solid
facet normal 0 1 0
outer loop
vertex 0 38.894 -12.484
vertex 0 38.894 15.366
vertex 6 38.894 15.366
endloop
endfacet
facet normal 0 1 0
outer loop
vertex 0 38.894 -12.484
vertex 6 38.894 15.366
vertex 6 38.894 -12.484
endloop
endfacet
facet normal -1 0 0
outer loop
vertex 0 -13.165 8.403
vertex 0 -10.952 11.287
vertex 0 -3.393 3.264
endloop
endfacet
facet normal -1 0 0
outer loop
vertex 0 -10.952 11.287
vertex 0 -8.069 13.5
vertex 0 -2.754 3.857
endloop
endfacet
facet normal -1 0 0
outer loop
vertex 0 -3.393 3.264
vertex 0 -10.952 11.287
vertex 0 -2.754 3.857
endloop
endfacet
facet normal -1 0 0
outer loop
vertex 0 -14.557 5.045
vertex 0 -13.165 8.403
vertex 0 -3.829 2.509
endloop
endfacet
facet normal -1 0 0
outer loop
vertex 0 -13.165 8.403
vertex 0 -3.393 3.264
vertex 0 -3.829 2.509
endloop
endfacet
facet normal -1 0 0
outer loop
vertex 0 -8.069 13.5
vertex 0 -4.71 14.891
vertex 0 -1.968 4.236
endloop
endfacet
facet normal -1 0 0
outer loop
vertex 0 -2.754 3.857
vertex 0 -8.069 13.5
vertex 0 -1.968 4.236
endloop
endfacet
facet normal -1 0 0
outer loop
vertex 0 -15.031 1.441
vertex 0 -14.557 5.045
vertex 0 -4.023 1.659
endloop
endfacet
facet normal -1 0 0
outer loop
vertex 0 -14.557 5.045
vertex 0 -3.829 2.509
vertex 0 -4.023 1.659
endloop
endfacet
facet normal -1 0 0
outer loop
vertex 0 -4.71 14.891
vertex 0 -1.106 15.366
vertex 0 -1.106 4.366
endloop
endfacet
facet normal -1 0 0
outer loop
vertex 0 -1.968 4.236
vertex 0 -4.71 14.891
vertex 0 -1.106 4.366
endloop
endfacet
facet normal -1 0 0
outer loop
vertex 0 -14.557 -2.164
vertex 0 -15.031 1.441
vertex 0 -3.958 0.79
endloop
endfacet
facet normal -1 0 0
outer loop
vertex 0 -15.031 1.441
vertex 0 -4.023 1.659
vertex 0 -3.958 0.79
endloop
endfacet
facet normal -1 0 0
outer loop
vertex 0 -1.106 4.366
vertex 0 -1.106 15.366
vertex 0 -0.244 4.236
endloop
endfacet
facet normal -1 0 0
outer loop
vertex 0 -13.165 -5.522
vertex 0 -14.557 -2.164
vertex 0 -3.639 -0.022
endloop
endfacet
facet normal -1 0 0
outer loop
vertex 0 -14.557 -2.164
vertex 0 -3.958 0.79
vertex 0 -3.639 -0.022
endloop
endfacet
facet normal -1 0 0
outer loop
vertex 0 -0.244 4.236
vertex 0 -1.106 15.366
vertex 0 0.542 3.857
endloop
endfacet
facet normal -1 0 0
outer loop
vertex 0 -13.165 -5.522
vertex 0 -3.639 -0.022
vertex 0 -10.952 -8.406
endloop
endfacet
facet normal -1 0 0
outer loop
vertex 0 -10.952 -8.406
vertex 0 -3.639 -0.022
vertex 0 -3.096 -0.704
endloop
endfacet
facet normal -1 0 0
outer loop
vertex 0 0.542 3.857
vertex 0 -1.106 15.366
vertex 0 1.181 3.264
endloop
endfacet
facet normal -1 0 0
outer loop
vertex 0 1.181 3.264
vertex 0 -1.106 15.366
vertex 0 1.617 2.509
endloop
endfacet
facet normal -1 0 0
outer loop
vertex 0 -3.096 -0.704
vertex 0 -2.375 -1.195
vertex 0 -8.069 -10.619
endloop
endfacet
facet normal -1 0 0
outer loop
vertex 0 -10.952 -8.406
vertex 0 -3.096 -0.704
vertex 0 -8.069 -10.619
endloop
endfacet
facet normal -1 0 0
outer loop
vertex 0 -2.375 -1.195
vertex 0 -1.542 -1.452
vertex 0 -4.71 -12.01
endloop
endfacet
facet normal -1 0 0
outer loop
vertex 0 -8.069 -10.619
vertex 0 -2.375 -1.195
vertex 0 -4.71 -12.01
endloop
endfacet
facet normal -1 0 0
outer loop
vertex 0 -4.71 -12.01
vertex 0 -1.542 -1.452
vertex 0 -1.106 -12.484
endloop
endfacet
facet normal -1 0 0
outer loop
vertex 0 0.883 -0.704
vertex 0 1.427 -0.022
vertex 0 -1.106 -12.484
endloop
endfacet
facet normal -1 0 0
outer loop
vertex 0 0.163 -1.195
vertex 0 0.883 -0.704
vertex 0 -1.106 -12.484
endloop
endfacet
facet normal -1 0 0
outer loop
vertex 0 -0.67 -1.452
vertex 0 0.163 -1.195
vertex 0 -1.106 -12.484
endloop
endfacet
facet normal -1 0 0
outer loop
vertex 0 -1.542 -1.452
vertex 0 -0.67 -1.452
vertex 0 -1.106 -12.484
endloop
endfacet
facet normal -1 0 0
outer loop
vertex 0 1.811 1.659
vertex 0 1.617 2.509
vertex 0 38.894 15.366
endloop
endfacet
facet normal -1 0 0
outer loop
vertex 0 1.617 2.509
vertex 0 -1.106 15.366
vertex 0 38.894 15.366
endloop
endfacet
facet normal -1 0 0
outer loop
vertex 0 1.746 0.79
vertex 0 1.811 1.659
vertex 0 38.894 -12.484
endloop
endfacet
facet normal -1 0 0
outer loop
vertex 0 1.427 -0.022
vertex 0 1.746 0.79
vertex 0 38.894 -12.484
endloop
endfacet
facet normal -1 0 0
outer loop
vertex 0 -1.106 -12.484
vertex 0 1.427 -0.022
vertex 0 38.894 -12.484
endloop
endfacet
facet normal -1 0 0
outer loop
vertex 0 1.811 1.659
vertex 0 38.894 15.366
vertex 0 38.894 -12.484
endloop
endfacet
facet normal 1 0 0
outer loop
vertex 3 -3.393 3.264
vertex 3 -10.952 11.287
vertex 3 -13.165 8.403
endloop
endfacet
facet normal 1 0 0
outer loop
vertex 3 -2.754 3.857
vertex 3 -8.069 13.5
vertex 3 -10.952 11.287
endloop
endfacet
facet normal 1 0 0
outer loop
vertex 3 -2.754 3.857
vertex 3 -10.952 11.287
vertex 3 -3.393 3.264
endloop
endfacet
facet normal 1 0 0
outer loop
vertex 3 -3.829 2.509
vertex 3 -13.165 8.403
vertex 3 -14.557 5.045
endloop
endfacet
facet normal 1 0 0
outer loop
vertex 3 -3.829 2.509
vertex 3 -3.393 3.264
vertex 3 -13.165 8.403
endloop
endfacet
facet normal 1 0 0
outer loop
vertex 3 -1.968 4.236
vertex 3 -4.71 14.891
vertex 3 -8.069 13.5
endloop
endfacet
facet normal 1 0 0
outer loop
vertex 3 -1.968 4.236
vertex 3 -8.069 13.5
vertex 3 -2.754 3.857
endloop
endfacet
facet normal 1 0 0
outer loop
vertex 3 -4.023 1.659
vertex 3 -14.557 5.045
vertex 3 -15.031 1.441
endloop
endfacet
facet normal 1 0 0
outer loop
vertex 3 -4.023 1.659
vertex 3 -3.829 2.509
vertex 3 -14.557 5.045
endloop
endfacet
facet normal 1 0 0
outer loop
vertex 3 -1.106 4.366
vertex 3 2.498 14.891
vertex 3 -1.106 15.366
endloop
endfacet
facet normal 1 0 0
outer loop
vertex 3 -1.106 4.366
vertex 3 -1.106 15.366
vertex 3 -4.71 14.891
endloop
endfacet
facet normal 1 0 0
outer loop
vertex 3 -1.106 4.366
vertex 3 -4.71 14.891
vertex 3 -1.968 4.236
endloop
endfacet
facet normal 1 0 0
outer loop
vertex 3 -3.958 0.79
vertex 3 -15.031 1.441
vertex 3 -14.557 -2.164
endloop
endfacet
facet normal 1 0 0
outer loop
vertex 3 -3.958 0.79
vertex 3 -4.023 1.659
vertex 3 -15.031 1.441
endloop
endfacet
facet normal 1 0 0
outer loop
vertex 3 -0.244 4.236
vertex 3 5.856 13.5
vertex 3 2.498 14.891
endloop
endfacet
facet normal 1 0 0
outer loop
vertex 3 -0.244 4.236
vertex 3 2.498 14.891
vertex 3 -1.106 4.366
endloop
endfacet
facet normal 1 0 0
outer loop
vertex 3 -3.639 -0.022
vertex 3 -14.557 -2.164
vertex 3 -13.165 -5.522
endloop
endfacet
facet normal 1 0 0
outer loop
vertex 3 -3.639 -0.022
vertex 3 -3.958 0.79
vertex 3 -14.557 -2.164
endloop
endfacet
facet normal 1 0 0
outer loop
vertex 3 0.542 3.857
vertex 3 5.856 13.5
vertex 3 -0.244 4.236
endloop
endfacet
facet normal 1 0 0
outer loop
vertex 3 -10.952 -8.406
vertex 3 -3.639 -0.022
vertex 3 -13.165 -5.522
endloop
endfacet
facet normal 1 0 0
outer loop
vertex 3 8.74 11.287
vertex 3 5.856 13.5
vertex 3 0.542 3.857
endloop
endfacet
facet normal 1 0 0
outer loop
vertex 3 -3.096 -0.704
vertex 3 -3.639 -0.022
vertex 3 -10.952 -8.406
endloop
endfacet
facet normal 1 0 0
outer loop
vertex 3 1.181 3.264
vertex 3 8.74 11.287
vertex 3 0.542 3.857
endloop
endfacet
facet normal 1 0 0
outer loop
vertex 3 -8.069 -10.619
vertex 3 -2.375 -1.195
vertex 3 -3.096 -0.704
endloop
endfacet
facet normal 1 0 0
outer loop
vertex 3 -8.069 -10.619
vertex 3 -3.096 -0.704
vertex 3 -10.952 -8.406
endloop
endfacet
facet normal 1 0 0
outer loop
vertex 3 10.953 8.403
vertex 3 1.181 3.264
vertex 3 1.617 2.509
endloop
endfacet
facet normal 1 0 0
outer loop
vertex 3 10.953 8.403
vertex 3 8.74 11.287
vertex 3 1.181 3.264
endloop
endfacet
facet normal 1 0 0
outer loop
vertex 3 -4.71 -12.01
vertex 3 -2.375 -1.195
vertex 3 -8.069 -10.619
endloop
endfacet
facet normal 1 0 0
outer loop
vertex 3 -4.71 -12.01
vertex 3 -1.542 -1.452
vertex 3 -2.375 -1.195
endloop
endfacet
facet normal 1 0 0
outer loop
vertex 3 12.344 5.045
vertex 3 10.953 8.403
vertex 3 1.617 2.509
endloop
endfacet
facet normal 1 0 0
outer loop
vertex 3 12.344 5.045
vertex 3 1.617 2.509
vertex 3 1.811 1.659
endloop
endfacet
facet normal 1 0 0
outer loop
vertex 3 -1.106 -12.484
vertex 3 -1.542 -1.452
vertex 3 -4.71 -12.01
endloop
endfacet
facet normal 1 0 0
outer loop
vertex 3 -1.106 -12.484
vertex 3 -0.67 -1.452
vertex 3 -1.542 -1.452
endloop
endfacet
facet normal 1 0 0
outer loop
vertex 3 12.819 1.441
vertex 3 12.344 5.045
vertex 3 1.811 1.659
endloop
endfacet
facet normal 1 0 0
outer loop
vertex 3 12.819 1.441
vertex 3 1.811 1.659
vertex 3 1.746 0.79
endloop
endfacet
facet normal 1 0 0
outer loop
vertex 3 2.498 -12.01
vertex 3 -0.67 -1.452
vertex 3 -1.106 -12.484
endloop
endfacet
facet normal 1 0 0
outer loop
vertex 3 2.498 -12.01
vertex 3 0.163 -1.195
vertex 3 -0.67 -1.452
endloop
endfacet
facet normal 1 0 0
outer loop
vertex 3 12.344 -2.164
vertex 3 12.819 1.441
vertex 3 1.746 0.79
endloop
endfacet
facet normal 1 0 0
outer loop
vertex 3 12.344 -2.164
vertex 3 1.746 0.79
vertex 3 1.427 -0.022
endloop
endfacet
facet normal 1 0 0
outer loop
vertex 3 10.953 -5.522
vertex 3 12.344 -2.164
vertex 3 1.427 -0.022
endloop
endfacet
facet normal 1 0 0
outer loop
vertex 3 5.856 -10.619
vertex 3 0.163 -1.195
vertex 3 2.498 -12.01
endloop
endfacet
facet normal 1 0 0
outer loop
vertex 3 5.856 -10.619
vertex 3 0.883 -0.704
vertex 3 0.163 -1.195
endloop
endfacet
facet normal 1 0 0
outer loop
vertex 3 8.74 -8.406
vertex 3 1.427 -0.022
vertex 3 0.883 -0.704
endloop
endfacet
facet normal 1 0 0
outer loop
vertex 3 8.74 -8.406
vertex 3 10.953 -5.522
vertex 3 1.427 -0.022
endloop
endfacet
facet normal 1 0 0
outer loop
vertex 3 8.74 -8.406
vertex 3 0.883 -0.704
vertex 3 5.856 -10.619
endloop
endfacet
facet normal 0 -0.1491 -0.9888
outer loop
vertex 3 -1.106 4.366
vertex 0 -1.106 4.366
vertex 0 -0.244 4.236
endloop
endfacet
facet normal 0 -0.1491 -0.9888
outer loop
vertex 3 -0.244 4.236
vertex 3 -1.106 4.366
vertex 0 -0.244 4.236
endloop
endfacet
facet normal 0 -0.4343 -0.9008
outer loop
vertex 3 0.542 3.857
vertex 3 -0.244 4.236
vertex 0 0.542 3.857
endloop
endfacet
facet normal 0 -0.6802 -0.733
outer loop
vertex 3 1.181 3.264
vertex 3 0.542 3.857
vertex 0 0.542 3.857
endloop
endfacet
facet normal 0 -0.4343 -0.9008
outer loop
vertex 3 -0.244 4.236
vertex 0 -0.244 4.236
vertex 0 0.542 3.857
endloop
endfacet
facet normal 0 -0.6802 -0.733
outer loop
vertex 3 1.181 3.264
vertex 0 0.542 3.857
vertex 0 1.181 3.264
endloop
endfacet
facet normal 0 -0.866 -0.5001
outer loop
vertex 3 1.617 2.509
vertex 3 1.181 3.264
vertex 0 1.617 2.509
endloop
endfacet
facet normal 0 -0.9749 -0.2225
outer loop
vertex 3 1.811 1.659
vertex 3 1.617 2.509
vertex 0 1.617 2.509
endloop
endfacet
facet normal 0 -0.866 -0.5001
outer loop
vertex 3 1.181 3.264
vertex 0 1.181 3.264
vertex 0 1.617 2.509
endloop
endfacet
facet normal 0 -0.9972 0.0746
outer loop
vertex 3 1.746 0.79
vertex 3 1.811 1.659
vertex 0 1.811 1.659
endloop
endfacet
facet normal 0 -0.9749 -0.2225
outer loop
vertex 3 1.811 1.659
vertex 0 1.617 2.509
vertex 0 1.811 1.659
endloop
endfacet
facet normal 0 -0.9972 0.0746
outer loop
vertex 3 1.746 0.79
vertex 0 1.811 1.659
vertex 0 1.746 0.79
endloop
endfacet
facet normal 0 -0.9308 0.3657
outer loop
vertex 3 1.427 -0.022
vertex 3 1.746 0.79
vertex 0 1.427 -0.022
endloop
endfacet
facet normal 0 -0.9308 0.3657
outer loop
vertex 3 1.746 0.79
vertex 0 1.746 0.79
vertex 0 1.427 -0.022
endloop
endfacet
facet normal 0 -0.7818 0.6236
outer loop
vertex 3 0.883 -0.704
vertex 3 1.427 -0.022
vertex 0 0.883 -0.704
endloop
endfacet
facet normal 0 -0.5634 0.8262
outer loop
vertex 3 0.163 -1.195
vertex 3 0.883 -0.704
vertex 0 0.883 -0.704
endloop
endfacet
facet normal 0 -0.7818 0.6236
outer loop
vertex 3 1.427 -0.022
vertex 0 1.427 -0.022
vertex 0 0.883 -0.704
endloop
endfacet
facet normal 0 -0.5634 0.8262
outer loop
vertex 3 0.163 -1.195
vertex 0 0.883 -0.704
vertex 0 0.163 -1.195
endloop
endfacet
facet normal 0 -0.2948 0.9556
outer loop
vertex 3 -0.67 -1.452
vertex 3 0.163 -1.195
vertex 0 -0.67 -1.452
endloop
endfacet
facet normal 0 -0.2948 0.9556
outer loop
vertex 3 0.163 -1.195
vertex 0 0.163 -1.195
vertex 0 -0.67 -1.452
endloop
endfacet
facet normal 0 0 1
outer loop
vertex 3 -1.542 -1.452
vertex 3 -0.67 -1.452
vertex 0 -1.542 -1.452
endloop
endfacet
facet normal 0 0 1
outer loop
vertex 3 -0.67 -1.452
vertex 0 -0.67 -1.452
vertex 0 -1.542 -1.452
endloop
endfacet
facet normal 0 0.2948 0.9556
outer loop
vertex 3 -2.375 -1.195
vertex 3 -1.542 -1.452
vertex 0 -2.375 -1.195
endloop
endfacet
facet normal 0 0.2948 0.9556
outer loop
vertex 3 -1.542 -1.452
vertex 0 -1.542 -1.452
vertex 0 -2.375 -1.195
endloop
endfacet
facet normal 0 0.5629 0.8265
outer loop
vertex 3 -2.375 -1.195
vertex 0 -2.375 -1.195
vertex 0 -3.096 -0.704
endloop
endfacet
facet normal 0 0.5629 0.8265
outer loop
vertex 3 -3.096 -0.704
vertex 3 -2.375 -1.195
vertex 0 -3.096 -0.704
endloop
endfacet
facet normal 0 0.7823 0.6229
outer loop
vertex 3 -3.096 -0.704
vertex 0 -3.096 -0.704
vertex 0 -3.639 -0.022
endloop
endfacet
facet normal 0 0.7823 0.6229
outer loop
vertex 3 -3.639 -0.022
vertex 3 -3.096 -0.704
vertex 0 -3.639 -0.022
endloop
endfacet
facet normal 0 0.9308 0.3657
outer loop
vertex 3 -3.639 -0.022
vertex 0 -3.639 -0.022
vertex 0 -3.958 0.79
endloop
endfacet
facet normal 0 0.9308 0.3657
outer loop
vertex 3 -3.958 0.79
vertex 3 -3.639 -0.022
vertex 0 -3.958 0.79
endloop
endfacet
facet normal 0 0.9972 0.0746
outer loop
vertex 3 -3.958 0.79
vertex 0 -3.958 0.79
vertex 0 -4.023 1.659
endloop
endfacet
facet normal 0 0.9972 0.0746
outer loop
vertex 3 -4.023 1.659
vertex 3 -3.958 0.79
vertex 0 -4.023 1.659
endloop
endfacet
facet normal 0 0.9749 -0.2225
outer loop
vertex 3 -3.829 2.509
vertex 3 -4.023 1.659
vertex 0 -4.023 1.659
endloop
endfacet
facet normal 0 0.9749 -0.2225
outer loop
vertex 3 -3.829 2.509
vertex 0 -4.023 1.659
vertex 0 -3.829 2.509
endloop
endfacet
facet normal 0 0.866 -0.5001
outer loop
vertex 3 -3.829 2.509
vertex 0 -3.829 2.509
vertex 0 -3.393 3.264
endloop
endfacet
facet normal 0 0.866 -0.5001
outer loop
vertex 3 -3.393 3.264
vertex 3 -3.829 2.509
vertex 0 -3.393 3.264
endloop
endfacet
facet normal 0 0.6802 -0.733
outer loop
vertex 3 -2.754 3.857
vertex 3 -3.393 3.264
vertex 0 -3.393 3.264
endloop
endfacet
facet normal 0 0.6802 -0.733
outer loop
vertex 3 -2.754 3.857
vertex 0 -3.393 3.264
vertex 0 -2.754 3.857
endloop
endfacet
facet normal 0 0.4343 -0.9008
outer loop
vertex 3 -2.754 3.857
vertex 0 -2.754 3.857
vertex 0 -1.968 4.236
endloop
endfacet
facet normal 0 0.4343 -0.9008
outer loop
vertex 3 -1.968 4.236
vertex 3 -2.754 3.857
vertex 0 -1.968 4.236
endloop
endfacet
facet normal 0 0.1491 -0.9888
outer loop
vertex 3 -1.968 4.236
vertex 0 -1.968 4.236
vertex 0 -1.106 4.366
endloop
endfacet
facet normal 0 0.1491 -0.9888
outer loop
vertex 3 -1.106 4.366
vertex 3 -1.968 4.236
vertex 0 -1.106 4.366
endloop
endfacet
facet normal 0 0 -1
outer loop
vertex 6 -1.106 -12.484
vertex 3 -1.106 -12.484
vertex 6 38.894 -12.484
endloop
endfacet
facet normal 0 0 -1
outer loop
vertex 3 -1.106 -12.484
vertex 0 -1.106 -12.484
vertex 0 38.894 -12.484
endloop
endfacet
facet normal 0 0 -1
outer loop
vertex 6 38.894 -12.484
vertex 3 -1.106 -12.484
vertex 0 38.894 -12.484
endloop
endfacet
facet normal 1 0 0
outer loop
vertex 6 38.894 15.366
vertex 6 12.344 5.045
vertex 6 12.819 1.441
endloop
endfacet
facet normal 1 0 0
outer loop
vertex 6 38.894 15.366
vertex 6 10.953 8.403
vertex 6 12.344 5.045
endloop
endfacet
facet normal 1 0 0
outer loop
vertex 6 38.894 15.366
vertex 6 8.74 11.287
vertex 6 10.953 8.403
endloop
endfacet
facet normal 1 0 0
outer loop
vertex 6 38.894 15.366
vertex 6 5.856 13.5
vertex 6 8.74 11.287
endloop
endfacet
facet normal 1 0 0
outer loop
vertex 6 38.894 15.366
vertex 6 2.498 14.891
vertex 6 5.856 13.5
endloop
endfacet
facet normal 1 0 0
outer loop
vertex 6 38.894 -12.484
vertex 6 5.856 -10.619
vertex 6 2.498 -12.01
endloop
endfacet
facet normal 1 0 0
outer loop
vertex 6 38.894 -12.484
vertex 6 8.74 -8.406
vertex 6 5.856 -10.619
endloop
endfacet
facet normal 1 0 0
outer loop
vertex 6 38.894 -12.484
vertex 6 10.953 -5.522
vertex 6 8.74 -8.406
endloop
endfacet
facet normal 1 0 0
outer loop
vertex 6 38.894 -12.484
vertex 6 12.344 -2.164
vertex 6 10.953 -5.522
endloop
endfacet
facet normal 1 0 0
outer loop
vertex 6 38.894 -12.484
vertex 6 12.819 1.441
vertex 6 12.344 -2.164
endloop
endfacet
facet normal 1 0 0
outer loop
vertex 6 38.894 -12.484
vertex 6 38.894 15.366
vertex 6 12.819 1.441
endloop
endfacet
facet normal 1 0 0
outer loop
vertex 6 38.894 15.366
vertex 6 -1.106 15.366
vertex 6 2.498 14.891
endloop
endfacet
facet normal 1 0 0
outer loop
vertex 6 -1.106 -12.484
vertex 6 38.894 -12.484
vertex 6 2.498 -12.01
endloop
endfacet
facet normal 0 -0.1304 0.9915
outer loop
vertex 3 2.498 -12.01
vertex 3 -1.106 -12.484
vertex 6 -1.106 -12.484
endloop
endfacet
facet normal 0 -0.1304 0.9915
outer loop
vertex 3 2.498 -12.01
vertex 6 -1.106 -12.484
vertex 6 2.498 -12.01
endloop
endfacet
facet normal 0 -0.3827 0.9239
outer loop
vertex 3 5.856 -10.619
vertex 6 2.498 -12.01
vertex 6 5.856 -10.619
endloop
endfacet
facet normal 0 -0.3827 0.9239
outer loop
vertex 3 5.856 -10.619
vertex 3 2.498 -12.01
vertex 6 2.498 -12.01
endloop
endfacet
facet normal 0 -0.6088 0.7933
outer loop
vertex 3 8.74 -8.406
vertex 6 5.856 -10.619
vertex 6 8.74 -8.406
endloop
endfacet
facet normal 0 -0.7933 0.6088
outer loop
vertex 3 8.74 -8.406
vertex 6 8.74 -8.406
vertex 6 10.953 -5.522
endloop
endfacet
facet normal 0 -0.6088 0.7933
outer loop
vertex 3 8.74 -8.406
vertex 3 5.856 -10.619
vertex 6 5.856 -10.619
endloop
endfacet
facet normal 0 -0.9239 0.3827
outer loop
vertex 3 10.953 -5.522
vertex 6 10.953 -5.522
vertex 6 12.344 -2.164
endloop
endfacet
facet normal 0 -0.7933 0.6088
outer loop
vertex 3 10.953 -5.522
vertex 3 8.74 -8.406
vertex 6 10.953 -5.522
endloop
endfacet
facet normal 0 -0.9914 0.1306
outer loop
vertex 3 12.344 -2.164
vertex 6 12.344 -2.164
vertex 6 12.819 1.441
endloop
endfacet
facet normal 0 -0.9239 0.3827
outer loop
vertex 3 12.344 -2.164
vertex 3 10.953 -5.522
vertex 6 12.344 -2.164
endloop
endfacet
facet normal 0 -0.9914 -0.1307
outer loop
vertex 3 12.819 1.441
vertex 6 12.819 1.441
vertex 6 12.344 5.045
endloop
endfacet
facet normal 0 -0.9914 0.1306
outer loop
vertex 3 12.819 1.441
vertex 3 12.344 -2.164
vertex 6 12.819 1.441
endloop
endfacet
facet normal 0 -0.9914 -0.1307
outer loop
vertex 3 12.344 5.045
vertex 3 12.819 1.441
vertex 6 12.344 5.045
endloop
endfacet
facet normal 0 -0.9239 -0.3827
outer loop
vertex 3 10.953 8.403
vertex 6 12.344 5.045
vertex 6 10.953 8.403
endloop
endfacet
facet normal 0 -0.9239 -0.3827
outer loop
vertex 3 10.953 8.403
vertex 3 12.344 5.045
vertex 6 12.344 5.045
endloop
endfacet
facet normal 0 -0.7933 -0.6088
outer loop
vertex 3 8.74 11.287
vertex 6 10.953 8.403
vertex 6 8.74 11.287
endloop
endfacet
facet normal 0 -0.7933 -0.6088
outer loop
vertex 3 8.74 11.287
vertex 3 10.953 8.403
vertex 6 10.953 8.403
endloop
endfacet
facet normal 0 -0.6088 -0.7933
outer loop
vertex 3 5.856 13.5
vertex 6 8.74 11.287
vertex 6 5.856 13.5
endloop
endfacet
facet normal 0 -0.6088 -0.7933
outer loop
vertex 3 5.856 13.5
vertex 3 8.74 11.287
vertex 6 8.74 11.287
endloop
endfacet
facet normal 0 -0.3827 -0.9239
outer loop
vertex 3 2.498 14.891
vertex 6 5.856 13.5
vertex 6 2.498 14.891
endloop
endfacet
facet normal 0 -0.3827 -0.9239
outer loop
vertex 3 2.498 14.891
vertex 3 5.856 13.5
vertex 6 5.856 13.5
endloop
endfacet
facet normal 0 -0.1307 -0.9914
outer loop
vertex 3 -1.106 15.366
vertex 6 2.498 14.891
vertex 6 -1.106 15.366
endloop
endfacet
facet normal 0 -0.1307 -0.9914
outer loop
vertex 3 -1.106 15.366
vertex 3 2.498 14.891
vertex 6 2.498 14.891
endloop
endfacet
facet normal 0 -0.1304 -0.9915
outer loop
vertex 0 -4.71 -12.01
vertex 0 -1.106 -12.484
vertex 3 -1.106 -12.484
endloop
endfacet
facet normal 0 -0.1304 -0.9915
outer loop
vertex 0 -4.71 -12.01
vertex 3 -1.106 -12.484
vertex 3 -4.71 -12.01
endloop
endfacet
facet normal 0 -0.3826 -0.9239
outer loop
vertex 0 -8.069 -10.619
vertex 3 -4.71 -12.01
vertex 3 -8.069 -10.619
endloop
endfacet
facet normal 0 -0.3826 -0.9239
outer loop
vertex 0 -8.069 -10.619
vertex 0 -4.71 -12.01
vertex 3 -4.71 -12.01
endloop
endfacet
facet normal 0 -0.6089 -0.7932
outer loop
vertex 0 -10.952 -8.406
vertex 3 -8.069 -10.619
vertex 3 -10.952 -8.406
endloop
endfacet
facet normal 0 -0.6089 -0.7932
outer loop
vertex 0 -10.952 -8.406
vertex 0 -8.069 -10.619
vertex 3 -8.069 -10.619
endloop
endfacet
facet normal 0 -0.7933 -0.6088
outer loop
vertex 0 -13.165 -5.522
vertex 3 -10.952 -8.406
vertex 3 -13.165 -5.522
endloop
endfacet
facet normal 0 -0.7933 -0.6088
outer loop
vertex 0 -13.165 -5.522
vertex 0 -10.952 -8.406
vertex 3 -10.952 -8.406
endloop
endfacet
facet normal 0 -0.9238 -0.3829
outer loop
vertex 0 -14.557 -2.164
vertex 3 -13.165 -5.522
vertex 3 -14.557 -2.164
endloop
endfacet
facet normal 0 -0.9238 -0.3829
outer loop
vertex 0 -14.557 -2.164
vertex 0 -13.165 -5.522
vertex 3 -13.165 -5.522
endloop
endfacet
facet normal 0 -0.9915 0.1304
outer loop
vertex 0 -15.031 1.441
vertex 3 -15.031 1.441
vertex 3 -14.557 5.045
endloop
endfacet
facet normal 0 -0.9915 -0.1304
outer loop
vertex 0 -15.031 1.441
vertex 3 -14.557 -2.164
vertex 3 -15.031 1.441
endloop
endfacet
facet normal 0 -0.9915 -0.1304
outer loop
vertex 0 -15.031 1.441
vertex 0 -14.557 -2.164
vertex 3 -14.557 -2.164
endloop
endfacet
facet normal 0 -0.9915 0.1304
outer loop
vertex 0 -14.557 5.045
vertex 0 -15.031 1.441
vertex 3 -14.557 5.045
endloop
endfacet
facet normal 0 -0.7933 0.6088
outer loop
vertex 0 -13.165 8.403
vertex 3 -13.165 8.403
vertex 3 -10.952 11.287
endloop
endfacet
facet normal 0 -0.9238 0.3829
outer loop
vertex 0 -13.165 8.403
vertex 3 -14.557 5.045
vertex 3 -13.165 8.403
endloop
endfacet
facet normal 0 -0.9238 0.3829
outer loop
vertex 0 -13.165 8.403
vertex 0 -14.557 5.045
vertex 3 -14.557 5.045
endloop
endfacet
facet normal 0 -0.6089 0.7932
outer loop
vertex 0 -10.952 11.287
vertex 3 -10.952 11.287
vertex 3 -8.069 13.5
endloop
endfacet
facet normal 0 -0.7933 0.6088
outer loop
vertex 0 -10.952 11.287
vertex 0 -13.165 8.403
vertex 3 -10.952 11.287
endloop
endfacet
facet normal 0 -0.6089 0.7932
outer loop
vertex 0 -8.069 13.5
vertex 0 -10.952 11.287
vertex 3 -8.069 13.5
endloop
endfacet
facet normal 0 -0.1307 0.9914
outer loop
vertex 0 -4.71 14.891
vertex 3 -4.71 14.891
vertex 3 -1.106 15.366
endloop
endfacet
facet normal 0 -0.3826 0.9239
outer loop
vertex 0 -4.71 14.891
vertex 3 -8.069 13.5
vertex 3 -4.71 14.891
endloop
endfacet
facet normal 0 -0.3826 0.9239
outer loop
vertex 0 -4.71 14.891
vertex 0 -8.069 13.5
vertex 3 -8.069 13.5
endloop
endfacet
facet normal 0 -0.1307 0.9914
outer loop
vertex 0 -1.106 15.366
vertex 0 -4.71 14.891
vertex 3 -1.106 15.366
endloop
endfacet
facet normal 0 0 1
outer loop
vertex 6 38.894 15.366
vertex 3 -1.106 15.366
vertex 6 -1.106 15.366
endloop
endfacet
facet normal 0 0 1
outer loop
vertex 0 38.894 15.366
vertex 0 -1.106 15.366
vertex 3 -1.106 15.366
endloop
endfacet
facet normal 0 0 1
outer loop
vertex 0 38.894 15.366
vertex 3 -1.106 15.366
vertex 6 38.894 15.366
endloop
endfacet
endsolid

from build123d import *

# Parameters (mm, degrees)
ESQUISSE1_W             = 27.85
ESQUISSE1_H             = 40
BOSS_EXTRU_1_DEPTH      = 6
ENL_V_START             = -3
ESQUISSE2_R             = 13.925
ENL_V_MAT_EXTRU_1_DEPTH = 3
ESQUISSE3_R             = 2.925
ENL_V_MAT_EXTRU_2_DEPTH = 10


with BuildPart() as part:
    # Esquisse1 → Boss.-Extru.1 (new body)
    with BuildSketch(Plane(origin=(0, 0, 0), x_dir=(0, 0, -1), z_dir=(1, 0, 0))):
        with Locations((-1.440517241, 18.893965517)):
            Rectangle(ESQUISSE1_W, ESQUISSE1_H)
        with BuildLine():
            ThreePointArc((12.484482759, -1.106034483), (-1.440517241, -15.031034483), (-15.365517241, -1.106034483))
            Line((-15.365517241, -1.106034483), (12.484482759, -1.106034483))
        make_face()
    extrude(amount=BOSS_EXTRU_1_DEPTH)

    # Esquisse2 → Enlèv. mat.-Extru.1 (cut)
    with BuildSketch(Plane(origin=(6, 0, 0), x_dir=(0, 0, -1), z_dir=(1, 0, 0)).offset(ENL_V_START)):
        with Locations((-1.440517241, -1.106034483)):
            Circle(ESQUISSE2_R)
    extrude(amount=ENL_V_MAT_EXTRU_1_DEPTH, mode=Mode.SUBTRACT)

    # Esquisse3 → Enlèv. mat.-Extru.2 (cut)
    with BuildSketch(Plane.ZY):
        with Locations((1.440517241, -1.106034483)):
            Circle(ESQUISSE3_R)
    extrude(amount=-ENL_V_MAT_EXTRU_2_DEPTH, mode=Mode.SUBTRACT)


solid = part.part
